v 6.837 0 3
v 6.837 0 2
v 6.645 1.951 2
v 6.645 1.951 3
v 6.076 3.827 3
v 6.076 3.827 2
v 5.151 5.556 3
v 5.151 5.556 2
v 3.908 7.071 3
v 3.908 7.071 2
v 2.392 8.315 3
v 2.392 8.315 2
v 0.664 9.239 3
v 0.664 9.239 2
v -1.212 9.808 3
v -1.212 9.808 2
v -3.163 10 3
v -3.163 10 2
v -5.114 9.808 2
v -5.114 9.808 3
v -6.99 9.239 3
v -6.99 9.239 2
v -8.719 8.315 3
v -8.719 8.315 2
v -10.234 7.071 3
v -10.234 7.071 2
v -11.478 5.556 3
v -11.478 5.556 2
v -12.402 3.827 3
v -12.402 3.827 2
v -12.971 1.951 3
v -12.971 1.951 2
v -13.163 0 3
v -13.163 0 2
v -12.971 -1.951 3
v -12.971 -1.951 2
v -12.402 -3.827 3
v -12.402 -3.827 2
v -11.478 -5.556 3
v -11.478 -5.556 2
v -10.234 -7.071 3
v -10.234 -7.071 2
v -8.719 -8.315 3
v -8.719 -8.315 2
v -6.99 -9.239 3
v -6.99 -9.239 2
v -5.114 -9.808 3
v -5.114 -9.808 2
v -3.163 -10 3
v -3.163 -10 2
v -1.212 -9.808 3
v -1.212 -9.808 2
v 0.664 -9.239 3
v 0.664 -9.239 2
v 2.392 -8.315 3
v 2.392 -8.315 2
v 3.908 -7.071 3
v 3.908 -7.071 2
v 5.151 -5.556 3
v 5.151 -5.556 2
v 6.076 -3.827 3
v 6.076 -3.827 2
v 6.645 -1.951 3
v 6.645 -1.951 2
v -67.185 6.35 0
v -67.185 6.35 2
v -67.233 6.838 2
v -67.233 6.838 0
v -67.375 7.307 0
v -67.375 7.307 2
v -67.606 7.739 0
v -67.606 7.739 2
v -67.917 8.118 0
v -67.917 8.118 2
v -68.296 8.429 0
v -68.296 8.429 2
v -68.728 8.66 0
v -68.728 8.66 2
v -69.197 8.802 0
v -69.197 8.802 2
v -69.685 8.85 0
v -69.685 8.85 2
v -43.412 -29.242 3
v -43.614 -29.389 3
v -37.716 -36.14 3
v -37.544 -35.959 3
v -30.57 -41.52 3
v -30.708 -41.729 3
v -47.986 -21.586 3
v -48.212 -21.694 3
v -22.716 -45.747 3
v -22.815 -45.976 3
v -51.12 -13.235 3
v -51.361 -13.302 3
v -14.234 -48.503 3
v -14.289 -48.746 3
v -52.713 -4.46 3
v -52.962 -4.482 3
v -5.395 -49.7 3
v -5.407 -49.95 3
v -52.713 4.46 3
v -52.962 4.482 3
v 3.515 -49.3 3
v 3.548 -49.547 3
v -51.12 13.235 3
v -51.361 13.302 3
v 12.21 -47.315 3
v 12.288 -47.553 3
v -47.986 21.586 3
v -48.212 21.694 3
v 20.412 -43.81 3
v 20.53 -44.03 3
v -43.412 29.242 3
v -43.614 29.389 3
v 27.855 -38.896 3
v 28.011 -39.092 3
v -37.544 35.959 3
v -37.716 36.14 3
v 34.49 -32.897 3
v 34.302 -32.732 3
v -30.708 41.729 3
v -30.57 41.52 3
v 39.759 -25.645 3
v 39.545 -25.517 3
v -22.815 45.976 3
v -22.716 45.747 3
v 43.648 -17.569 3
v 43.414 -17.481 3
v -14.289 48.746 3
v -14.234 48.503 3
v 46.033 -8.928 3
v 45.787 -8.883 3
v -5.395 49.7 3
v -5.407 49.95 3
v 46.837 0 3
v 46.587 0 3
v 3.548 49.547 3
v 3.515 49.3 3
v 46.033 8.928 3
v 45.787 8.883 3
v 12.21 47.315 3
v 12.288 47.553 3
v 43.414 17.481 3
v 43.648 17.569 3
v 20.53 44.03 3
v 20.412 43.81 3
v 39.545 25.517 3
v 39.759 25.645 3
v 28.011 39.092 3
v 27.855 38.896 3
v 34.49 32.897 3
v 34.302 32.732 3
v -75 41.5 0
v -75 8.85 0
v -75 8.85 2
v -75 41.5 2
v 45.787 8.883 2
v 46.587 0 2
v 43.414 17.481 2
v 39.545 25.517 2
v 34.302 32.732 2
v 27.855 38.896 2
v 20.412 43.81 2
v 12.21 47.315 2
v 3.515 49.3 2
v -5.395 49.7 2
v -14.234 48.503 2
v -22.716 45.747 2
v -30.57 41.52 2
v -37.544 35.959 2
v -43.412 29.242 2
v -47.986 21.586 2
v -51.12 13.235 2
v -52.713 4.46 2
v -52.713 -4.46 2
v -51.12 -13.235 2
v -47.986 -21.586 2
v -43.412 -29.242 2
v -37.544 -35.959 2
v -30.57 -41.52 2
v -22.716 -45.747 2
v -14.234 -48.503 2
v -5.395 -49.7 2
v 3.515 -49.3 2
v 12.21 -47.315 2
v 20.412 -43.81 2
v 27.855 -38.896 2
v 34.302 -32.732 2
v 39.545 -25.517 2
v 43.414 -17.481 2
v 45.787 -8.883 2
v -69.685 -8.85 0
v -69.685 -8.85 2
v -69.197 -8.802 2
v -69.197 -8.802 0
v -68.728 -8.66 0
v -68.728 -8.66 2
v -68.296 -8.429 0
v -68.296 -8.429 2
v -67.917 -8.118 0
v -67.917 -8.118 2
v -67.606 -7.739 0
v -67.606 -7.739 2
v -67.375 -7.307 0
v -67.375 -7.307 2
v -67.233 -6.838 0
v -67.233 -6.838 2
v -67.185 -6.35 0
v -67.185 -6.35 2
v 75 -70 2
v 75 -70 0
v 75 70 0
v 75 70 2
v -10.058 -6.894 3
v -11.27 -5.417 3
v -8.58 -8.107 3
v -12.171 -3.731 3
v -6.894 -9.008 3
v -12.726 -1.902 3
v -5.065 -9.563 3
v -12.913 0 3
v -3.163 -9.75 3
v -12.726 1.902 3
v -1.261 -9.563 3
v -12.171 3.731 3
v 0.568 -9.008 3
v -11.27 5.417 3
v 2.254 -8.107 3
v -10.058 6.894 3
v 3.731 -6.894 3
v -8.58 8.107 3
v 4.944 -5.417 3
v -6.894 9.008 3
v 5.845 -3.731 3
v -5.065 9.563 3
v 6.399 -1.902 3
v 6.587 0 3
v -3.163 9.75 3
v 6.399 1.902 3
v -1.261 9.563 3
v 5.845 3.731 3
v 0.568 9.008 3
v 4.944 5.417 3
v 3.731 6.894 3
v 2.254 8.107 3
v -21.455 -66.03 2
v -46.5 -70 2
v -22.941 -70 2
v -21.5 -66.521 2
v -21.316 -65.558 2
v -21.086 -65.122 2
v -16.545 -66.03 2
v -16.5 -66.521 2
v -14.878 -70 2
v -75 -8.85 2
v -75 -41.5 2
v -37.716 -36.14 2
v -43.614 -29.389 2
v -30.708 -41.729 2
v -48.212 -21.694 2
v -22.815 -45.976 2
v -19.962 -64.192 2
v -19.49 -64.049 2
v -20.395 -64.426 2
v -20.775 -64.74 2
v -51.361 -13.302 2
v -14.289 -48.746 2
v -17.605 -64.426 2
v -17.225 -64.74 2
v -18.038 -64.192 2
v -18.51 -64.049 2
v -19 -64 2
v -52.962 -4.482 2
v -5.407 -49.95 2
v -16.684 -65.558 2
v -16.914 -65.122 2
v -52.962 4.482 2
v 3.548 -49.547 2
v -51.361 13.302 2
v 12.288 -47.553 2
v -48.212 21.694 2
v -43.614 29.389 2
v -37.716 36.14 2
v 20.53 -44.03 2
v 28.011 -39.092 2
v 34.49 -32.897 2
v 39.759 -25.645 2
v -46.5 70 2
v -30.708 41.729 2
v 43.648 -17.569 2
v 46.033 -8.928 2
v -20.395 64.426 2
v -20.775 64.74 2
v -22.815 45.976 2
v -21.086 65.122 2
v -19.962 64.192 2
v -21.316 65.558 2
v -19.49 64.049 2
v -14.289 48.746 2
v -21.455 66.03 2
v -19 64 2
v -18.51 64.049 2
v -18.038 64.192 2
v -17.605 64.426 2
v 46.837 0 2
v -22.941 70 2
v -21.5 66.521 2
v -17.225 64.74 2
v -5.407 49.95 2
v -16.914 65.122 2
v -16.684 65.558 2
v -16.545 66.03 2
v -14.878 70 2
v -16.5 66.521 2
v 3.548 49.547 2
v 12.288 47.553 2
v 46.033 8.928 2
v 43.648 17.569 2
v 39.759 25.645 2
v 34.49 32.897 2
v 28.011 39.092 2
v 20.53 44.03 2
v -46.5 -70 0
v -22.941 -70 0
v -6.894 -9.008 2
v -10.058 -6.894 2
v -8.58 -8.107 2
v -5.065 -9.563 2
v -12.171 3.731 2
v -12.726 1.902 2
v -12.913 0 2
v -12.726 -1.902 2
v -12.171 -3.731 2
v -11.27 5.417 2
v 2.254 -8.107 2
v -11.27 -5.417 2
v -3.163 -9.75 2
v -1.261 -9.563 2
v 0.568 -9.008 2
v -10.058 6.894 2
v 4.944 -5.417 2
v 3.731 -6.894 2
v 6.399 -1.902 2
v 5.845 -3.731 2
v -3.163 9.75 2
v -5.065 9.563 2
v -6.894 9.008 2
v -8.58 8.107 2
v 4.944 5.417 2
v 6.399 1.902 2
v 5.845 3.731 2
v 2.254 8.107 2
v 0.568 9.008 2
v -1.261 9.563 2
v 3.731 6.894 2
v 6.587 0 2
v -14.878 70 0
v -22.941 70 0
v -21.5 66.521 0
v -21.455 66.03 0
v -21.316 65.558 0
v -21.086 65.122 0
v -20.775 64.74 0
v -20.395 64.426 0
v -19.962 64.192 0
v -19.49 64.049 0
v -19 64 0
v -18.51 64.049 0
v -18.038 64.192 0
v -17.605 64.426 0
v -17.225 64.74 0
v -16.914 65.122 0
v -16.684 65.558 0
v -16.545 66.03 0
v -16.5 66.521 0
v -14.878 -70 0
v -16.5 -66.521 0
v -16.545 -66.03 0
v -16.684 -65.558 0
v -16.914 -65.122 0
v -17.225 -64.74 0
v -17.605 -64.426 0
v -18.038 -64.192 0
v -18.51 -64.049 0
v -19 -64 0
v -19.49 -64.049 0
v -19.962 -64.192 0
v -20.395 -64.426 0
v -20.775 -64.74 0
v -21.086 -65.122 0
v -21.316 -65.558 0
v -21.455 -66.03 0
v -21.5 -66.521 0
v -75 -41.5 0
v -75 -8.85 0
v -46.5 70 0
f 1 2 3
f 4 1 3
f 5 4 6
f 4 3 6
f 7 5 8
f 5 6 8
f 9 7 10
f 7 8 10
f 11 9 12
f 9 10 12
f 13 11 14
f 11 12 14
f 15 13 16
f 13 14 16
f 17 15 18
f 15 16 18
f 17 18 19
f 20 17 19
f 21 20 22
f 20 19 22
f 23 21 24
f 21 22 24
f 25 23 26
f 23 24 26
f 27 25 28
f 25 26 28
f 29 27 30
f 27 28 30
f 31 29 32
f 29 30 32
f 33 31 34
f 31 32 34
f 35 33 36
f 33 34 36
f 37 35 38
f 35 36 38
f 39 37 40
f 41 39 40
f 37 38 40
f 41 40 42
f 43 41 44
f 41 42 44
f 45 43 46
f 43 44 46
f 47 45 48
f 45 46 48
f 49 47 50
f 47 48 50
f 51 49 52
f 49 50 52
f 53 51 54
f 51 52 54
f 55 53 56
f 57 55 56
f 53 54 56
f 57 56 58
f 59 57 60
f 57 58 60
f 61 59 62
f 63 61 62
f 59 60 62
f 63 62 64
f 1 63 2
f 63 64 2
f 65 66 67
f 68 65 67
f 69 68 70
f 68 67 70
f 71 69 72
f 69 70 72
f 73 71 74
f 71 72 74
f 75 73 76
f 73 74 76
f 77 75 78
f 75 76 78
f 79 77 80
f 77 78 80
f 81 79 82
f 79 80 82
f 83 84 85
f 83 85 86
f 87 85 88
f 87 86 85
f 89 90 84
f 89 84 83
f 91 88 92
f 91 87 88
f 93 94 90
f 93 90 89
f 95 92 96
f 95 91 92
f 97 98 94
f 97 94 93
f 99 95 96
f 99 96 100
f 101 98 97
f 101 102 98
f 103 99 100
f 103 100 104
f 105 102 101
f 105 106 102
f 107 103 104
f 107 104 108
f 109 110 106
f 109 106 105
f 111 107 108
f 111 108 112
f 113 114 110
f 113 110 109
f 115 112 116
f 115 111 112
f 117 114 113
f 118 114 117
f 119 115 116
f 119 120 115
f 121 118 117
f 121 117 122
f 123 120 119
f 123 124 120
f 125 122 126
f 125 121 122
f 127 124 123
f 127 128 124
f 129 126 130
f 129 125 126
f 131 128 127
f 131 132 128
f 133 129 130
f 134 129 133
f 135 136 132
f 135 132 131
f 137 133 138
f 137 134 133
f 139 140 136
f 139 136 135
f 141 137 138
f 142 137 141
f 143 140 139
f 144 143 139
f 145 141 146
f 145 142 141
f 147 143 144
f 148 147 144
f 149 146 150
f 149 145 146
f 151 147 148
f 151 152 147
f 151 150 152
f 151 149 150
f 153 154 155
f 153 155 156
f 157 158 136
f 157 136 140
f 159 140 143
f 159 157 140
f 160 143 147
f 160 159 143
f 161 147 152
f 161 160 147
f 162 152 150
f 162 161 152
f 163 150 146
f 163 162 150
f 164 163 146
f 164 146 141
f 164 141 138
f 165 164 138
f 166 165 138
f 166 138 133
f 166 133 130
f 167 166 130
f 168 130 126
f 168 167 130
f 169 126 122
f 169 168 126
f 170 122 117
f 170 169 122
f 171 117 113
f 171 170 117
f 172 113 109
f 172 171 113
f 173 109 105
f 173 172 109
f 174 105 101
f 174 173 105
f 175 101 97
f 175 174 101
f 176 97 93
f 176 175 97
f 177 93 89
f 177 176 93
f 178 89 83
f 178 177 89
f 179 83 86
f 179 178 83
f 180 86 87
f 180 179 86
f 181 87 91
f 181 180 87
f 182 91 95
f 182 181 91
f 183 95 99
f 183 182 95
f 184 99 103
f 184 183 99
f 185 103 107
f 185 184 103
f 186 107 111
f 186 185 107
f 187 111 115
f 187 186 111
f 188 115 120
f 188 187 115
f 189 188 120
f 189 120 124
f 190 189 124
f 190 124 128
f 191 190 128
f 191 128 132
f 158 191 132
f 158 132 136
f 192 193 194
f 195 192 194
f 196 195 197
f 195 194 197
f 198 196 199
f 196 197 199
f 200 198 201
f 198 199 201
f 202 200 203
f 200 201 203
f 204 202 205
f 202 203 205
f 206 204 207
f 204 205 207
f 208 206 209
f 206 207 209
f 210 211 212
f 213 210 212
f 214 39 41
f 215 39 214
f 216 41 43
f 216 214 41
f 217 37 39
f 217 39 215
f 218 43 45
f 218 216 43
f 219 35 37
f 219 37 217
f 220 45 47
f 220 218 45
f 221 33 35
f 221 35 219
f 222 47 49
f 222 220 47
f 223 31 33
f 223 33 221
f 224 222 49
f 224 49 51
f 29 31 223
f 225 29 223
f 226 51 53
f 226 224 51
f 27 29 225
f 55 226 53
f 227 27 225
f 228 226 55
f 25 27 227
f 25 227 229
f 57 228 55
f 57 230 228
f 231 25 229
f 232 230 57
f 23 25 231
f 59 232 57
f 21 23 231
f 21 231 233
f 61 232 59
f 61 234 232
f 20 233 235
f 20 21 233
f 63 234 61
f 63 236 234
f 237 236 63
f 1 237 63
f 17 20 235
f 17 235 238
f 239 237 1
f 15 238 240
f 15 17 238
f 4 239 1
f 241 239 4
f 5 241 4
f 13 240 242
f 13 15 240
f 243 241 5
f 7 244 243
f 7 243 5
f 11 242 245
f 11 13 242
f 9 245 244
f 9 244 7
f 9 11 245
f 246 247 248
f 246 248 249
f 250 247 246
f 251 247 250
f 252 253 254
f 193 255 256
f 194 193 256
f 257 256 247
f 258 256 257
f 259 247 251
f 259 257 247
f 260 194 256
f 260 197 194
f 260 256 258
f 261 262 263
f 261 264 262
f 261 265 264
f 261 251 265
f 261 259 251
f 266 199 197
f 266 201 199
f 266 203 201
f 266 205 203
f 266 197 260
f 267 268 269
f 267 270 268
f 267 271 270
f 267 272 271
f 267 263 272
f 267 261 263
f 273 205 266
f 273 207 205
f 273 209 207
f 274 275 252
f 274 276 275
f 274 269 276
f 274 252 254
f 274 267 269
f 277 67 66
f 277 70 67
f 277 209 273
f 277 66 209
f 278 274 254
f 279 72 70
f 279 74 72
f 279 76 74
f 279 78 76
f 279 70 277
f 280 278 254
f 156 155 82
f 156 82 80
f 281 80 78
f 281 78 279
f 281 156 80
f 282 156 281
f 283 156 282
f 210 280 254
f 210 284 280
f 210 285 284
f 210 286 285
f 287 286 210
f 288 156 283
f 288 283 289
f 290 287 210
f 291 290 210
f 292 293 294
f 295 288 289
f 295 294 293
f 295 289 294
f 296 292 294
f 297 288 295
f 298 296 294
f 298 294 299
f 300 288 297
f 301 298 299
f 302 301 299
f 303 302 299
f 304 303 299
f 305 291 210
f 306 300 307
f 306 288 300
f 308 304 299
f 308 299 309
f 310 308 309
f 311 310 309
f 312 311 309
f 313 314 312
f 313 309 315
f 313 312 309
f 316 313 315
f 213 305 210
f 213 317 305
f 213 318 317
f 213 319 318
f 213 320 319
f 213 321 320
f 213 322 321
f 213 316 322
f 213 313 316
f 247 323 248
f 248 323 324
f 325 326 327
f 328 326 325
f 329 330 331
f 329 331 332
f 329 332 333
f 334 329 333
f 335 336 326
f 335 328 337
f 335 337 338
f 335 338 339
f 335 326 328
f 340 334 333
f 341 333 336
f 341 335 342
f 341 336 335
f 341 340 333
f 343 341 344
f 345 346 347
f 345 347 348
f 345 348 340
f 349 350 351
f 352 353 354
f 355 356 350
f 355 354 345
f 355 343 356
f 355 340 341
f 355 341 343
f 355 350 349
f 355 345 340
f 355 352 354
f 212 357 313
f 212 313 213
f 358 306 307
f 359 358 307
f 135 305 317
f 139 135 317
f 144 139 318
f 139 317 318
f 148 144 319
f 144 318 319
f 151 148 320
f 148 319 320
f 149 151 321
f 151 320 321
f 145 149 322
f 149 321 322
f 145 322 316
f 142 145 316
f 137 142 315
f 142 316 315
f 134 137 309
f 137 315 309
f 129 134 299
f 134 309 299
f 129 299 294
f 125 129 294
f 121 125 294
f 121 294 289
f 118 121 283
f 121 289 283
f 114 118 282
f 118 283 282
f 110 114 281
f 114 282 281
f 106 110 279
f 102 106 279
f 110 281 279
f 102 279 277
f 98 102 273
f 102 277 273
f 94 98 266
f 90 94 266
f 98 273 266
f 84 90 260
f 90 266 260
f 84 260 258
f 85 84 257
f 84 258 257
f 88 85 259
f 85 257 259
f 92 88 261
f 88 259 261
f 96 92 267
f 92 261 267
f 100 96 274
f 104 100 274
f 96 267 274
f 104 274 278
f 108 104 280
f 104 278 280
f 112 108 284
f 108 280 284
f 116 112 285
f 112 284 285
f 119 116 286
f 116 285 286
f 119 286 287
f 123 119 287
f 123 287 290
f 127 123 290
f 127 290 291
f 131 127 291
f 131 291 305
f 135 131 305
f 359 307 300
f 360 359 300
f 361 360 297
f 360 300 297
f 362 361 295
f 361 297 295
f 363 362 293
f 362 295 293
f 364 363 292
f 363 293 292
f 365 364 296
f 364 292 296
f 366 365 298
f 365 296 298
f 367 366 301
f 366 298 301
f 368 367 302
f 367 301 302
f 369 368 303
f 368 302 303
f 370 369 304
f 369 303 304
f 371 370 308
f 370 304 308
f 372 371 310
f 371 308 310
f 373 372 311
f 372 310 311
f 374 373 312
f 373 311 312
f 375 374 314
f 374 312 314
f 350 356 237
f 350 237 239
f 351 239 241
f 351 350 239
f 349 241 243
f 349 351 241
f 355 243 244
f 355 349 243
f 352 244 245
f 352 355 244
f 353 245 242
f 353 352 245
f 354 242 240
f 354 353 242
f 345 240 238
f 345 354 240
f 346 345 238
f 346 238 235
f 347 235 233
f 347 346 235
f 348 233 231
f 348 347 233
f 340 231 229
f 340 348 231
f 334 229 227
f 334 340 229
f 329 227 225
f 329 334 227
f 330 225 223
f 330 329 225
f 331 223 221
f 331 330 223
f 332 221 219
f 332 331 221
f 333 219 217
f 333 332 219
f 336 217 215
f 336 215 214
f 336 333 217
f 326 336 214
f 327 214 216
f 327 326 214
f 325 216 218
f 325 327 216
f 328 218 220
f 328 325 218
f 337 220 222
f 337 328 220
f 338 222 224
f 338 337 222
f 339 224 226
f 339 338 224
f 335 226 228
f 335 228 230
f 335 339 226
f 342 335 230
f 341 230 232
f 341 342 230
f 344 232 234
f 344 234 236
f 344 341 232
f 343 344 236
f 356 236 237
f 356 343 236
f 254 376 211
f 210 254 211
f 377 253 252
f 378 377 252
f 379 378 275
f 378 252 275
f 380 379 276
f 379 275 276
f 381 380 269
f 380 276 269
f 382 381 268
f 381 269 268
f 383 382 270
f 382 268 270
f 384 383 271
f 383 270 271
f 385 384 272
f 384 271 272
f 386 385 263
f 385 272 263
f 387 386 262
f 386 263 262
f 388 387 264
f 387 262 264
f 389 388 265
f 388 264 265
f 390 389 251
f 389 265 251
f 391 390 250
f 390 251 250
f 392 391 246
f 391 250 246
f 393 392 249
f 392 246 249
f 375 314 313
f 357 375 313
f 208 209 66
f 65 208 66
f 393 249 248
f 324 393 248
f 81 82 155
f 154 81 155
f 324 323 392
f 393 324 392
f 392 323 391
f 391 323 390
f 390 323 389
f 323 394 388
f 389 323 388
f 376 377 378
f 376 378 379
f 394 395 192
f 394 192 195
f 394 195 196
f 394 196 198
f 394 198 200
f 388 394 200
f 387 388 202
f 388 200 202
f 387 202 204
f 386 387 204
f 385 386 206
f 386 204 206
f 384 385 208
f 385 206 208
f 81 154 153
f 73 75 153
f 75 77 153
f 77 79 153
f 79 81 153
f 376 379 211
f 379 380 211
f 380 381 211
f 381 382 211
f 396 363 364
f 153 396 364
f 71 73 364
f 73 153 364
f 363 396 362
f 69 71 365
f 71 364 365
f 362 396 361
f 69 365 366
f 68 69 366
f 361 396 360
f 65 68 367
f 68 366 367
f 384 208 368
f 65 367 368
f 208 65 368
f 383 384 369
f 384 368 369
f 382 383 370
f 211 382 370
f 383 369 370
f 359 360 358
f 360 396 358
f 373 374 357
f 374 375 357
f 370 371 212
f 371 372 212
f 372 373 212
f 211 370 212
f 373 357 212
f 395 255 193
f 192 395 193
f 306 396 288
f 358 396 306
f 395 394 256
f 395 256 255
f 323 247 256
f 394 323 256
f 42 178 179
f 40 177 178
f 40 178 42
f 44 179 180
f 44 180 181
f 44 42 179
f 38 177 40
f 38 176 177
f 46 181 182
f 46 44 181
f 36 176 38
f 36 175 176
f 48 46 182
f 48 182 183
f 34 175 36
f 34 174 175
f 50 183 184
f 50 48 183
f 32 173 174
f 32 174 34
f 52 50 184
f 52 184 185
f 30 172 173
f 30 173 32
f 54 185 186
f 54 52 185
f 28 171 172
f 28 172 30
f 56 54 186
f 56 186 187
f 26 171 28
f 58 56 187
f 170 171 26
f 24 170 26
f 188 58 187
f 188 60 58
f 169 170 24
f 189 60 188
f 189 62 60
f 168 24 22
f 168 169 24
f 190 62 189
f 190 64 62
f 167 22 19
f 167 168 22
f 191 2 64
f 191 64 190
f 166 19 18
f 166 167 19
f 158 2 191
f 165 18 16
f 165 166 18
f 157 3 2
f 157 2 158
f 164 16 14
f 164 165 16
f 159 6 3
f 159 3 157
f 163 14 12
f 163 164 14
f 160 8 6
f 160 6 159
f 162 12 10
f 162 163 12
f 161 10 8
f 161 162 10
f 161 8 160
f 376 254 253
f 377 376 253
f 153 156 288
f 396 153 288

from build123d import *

# Parameters (mm, degrees)
F0_W     = 150
F0_H     = 140
F1_DEPTH = 2
F2_R     = 2.5
F3_DEPTH = 5
F4_R     = 50
F4_R_2   = 49.75
F5_DEPTH = 1
F6_R     = 10
F6_R_2   = 9.75
F7_DEPTH = 1


with BuildPart() as f1:
    # F0 (on Top) → F1 (new body)
    with BuildSketch(Plane.XY):
        Rectangle(F0_W, F0_H)
    extrude(amount=F1_DEPTH)

    # F2 (on face) → F3 (cut)
    with BuildSketch(Plane.XY.offset(2)):
        Polygon((-75, 70), (-75, 41.5), (-46.5, 70), align=None)
        with Locations((-64, 57.6)):
            Circle(F2_R, mode=Mode.SUBTRACT)
        Polygon((-46.5, -70), (-75, -41.5), (-75, -70), align=None)
        with Locations((-64, -57.6)):
            Circle(F2_R, mode=Mode.SUBTRACT)
        with BuildLine():
            Line((-67.1845650673, -6.35), (-67.1845650673, 6.35))
            ThreePointArc((-67.1845650673, 6.35), (-67.9167981143, 8.117766953), (-69.6845650673, 8.85))
            Line((-69.6845650673, 8.85), (-75, 8.85))
            Line((-75, 8.85), (-75, -8.85))
            Line((-75, -8.85), (-69.6845650673, -8.85))
            ThreePointArc((-69.6845650673, -8.85), (-67.9167981143, -8.117766953), (-67.1845650673, -6.35))
        make_face()
        with BuildLine():
            Line((-21.499911428, -66.5210440509), (-22.940942165, -70))
            Line((-22.940942165, -70), (-14.8778247705, -70))
            Line((-14.8778247705, -70), (-16.500088572, -66.5210440509))
            ThreePointArc((-16.500088572, -66.5210440509), (-19, -64), (-21.499911428, -66.5210440509))
        make_face()
        with BuildLine():
            Line((-14.8778247705, 70), (-22.940942165, 70))
            Line((-22.940942165, 70), (-21.499911428, 66.5210440509))
            ThreePointArc((-21.499911428, 66.5210440509), (-19, 64), (-16.500088572, 66.5210440509))
            Line((-16.500088572, 66.5210440509), (-14.8778247705, 70))
        make_face()
        with Locations((-64, 57.6)):
            Circle(F2_R)
        with Locations((-64, -57.6)):
            Circle(F2_R)
    extrude(amount=-F3_DEPTH, mode=Mode.SUBTRACT)

    # F4 (on face) → F5 (join)
    with BuildSketch(Plane.XY.offset(2)):
        with Locations((-3.16328, 0)):
            Circle(F4_R)
        with Locations((-3.16328, 0)):
            Circle(F4_R_2, mode=Mode.SUBTRACT)
    extrude(amount=F5_DEPTH)

    # F6 (on face) → F7 (join)
    with BuildSketch(Plane.XY.offset(2)):
        with Locations((-3.16328, 0)):
            Circle(F6_R)
        with Locations((-3.16328, 0)):
            Circle(F6_R_2, mode=Mode.SUBTRACT)
    extrude(amount=F7_DEPTH)


solid = f1.part
